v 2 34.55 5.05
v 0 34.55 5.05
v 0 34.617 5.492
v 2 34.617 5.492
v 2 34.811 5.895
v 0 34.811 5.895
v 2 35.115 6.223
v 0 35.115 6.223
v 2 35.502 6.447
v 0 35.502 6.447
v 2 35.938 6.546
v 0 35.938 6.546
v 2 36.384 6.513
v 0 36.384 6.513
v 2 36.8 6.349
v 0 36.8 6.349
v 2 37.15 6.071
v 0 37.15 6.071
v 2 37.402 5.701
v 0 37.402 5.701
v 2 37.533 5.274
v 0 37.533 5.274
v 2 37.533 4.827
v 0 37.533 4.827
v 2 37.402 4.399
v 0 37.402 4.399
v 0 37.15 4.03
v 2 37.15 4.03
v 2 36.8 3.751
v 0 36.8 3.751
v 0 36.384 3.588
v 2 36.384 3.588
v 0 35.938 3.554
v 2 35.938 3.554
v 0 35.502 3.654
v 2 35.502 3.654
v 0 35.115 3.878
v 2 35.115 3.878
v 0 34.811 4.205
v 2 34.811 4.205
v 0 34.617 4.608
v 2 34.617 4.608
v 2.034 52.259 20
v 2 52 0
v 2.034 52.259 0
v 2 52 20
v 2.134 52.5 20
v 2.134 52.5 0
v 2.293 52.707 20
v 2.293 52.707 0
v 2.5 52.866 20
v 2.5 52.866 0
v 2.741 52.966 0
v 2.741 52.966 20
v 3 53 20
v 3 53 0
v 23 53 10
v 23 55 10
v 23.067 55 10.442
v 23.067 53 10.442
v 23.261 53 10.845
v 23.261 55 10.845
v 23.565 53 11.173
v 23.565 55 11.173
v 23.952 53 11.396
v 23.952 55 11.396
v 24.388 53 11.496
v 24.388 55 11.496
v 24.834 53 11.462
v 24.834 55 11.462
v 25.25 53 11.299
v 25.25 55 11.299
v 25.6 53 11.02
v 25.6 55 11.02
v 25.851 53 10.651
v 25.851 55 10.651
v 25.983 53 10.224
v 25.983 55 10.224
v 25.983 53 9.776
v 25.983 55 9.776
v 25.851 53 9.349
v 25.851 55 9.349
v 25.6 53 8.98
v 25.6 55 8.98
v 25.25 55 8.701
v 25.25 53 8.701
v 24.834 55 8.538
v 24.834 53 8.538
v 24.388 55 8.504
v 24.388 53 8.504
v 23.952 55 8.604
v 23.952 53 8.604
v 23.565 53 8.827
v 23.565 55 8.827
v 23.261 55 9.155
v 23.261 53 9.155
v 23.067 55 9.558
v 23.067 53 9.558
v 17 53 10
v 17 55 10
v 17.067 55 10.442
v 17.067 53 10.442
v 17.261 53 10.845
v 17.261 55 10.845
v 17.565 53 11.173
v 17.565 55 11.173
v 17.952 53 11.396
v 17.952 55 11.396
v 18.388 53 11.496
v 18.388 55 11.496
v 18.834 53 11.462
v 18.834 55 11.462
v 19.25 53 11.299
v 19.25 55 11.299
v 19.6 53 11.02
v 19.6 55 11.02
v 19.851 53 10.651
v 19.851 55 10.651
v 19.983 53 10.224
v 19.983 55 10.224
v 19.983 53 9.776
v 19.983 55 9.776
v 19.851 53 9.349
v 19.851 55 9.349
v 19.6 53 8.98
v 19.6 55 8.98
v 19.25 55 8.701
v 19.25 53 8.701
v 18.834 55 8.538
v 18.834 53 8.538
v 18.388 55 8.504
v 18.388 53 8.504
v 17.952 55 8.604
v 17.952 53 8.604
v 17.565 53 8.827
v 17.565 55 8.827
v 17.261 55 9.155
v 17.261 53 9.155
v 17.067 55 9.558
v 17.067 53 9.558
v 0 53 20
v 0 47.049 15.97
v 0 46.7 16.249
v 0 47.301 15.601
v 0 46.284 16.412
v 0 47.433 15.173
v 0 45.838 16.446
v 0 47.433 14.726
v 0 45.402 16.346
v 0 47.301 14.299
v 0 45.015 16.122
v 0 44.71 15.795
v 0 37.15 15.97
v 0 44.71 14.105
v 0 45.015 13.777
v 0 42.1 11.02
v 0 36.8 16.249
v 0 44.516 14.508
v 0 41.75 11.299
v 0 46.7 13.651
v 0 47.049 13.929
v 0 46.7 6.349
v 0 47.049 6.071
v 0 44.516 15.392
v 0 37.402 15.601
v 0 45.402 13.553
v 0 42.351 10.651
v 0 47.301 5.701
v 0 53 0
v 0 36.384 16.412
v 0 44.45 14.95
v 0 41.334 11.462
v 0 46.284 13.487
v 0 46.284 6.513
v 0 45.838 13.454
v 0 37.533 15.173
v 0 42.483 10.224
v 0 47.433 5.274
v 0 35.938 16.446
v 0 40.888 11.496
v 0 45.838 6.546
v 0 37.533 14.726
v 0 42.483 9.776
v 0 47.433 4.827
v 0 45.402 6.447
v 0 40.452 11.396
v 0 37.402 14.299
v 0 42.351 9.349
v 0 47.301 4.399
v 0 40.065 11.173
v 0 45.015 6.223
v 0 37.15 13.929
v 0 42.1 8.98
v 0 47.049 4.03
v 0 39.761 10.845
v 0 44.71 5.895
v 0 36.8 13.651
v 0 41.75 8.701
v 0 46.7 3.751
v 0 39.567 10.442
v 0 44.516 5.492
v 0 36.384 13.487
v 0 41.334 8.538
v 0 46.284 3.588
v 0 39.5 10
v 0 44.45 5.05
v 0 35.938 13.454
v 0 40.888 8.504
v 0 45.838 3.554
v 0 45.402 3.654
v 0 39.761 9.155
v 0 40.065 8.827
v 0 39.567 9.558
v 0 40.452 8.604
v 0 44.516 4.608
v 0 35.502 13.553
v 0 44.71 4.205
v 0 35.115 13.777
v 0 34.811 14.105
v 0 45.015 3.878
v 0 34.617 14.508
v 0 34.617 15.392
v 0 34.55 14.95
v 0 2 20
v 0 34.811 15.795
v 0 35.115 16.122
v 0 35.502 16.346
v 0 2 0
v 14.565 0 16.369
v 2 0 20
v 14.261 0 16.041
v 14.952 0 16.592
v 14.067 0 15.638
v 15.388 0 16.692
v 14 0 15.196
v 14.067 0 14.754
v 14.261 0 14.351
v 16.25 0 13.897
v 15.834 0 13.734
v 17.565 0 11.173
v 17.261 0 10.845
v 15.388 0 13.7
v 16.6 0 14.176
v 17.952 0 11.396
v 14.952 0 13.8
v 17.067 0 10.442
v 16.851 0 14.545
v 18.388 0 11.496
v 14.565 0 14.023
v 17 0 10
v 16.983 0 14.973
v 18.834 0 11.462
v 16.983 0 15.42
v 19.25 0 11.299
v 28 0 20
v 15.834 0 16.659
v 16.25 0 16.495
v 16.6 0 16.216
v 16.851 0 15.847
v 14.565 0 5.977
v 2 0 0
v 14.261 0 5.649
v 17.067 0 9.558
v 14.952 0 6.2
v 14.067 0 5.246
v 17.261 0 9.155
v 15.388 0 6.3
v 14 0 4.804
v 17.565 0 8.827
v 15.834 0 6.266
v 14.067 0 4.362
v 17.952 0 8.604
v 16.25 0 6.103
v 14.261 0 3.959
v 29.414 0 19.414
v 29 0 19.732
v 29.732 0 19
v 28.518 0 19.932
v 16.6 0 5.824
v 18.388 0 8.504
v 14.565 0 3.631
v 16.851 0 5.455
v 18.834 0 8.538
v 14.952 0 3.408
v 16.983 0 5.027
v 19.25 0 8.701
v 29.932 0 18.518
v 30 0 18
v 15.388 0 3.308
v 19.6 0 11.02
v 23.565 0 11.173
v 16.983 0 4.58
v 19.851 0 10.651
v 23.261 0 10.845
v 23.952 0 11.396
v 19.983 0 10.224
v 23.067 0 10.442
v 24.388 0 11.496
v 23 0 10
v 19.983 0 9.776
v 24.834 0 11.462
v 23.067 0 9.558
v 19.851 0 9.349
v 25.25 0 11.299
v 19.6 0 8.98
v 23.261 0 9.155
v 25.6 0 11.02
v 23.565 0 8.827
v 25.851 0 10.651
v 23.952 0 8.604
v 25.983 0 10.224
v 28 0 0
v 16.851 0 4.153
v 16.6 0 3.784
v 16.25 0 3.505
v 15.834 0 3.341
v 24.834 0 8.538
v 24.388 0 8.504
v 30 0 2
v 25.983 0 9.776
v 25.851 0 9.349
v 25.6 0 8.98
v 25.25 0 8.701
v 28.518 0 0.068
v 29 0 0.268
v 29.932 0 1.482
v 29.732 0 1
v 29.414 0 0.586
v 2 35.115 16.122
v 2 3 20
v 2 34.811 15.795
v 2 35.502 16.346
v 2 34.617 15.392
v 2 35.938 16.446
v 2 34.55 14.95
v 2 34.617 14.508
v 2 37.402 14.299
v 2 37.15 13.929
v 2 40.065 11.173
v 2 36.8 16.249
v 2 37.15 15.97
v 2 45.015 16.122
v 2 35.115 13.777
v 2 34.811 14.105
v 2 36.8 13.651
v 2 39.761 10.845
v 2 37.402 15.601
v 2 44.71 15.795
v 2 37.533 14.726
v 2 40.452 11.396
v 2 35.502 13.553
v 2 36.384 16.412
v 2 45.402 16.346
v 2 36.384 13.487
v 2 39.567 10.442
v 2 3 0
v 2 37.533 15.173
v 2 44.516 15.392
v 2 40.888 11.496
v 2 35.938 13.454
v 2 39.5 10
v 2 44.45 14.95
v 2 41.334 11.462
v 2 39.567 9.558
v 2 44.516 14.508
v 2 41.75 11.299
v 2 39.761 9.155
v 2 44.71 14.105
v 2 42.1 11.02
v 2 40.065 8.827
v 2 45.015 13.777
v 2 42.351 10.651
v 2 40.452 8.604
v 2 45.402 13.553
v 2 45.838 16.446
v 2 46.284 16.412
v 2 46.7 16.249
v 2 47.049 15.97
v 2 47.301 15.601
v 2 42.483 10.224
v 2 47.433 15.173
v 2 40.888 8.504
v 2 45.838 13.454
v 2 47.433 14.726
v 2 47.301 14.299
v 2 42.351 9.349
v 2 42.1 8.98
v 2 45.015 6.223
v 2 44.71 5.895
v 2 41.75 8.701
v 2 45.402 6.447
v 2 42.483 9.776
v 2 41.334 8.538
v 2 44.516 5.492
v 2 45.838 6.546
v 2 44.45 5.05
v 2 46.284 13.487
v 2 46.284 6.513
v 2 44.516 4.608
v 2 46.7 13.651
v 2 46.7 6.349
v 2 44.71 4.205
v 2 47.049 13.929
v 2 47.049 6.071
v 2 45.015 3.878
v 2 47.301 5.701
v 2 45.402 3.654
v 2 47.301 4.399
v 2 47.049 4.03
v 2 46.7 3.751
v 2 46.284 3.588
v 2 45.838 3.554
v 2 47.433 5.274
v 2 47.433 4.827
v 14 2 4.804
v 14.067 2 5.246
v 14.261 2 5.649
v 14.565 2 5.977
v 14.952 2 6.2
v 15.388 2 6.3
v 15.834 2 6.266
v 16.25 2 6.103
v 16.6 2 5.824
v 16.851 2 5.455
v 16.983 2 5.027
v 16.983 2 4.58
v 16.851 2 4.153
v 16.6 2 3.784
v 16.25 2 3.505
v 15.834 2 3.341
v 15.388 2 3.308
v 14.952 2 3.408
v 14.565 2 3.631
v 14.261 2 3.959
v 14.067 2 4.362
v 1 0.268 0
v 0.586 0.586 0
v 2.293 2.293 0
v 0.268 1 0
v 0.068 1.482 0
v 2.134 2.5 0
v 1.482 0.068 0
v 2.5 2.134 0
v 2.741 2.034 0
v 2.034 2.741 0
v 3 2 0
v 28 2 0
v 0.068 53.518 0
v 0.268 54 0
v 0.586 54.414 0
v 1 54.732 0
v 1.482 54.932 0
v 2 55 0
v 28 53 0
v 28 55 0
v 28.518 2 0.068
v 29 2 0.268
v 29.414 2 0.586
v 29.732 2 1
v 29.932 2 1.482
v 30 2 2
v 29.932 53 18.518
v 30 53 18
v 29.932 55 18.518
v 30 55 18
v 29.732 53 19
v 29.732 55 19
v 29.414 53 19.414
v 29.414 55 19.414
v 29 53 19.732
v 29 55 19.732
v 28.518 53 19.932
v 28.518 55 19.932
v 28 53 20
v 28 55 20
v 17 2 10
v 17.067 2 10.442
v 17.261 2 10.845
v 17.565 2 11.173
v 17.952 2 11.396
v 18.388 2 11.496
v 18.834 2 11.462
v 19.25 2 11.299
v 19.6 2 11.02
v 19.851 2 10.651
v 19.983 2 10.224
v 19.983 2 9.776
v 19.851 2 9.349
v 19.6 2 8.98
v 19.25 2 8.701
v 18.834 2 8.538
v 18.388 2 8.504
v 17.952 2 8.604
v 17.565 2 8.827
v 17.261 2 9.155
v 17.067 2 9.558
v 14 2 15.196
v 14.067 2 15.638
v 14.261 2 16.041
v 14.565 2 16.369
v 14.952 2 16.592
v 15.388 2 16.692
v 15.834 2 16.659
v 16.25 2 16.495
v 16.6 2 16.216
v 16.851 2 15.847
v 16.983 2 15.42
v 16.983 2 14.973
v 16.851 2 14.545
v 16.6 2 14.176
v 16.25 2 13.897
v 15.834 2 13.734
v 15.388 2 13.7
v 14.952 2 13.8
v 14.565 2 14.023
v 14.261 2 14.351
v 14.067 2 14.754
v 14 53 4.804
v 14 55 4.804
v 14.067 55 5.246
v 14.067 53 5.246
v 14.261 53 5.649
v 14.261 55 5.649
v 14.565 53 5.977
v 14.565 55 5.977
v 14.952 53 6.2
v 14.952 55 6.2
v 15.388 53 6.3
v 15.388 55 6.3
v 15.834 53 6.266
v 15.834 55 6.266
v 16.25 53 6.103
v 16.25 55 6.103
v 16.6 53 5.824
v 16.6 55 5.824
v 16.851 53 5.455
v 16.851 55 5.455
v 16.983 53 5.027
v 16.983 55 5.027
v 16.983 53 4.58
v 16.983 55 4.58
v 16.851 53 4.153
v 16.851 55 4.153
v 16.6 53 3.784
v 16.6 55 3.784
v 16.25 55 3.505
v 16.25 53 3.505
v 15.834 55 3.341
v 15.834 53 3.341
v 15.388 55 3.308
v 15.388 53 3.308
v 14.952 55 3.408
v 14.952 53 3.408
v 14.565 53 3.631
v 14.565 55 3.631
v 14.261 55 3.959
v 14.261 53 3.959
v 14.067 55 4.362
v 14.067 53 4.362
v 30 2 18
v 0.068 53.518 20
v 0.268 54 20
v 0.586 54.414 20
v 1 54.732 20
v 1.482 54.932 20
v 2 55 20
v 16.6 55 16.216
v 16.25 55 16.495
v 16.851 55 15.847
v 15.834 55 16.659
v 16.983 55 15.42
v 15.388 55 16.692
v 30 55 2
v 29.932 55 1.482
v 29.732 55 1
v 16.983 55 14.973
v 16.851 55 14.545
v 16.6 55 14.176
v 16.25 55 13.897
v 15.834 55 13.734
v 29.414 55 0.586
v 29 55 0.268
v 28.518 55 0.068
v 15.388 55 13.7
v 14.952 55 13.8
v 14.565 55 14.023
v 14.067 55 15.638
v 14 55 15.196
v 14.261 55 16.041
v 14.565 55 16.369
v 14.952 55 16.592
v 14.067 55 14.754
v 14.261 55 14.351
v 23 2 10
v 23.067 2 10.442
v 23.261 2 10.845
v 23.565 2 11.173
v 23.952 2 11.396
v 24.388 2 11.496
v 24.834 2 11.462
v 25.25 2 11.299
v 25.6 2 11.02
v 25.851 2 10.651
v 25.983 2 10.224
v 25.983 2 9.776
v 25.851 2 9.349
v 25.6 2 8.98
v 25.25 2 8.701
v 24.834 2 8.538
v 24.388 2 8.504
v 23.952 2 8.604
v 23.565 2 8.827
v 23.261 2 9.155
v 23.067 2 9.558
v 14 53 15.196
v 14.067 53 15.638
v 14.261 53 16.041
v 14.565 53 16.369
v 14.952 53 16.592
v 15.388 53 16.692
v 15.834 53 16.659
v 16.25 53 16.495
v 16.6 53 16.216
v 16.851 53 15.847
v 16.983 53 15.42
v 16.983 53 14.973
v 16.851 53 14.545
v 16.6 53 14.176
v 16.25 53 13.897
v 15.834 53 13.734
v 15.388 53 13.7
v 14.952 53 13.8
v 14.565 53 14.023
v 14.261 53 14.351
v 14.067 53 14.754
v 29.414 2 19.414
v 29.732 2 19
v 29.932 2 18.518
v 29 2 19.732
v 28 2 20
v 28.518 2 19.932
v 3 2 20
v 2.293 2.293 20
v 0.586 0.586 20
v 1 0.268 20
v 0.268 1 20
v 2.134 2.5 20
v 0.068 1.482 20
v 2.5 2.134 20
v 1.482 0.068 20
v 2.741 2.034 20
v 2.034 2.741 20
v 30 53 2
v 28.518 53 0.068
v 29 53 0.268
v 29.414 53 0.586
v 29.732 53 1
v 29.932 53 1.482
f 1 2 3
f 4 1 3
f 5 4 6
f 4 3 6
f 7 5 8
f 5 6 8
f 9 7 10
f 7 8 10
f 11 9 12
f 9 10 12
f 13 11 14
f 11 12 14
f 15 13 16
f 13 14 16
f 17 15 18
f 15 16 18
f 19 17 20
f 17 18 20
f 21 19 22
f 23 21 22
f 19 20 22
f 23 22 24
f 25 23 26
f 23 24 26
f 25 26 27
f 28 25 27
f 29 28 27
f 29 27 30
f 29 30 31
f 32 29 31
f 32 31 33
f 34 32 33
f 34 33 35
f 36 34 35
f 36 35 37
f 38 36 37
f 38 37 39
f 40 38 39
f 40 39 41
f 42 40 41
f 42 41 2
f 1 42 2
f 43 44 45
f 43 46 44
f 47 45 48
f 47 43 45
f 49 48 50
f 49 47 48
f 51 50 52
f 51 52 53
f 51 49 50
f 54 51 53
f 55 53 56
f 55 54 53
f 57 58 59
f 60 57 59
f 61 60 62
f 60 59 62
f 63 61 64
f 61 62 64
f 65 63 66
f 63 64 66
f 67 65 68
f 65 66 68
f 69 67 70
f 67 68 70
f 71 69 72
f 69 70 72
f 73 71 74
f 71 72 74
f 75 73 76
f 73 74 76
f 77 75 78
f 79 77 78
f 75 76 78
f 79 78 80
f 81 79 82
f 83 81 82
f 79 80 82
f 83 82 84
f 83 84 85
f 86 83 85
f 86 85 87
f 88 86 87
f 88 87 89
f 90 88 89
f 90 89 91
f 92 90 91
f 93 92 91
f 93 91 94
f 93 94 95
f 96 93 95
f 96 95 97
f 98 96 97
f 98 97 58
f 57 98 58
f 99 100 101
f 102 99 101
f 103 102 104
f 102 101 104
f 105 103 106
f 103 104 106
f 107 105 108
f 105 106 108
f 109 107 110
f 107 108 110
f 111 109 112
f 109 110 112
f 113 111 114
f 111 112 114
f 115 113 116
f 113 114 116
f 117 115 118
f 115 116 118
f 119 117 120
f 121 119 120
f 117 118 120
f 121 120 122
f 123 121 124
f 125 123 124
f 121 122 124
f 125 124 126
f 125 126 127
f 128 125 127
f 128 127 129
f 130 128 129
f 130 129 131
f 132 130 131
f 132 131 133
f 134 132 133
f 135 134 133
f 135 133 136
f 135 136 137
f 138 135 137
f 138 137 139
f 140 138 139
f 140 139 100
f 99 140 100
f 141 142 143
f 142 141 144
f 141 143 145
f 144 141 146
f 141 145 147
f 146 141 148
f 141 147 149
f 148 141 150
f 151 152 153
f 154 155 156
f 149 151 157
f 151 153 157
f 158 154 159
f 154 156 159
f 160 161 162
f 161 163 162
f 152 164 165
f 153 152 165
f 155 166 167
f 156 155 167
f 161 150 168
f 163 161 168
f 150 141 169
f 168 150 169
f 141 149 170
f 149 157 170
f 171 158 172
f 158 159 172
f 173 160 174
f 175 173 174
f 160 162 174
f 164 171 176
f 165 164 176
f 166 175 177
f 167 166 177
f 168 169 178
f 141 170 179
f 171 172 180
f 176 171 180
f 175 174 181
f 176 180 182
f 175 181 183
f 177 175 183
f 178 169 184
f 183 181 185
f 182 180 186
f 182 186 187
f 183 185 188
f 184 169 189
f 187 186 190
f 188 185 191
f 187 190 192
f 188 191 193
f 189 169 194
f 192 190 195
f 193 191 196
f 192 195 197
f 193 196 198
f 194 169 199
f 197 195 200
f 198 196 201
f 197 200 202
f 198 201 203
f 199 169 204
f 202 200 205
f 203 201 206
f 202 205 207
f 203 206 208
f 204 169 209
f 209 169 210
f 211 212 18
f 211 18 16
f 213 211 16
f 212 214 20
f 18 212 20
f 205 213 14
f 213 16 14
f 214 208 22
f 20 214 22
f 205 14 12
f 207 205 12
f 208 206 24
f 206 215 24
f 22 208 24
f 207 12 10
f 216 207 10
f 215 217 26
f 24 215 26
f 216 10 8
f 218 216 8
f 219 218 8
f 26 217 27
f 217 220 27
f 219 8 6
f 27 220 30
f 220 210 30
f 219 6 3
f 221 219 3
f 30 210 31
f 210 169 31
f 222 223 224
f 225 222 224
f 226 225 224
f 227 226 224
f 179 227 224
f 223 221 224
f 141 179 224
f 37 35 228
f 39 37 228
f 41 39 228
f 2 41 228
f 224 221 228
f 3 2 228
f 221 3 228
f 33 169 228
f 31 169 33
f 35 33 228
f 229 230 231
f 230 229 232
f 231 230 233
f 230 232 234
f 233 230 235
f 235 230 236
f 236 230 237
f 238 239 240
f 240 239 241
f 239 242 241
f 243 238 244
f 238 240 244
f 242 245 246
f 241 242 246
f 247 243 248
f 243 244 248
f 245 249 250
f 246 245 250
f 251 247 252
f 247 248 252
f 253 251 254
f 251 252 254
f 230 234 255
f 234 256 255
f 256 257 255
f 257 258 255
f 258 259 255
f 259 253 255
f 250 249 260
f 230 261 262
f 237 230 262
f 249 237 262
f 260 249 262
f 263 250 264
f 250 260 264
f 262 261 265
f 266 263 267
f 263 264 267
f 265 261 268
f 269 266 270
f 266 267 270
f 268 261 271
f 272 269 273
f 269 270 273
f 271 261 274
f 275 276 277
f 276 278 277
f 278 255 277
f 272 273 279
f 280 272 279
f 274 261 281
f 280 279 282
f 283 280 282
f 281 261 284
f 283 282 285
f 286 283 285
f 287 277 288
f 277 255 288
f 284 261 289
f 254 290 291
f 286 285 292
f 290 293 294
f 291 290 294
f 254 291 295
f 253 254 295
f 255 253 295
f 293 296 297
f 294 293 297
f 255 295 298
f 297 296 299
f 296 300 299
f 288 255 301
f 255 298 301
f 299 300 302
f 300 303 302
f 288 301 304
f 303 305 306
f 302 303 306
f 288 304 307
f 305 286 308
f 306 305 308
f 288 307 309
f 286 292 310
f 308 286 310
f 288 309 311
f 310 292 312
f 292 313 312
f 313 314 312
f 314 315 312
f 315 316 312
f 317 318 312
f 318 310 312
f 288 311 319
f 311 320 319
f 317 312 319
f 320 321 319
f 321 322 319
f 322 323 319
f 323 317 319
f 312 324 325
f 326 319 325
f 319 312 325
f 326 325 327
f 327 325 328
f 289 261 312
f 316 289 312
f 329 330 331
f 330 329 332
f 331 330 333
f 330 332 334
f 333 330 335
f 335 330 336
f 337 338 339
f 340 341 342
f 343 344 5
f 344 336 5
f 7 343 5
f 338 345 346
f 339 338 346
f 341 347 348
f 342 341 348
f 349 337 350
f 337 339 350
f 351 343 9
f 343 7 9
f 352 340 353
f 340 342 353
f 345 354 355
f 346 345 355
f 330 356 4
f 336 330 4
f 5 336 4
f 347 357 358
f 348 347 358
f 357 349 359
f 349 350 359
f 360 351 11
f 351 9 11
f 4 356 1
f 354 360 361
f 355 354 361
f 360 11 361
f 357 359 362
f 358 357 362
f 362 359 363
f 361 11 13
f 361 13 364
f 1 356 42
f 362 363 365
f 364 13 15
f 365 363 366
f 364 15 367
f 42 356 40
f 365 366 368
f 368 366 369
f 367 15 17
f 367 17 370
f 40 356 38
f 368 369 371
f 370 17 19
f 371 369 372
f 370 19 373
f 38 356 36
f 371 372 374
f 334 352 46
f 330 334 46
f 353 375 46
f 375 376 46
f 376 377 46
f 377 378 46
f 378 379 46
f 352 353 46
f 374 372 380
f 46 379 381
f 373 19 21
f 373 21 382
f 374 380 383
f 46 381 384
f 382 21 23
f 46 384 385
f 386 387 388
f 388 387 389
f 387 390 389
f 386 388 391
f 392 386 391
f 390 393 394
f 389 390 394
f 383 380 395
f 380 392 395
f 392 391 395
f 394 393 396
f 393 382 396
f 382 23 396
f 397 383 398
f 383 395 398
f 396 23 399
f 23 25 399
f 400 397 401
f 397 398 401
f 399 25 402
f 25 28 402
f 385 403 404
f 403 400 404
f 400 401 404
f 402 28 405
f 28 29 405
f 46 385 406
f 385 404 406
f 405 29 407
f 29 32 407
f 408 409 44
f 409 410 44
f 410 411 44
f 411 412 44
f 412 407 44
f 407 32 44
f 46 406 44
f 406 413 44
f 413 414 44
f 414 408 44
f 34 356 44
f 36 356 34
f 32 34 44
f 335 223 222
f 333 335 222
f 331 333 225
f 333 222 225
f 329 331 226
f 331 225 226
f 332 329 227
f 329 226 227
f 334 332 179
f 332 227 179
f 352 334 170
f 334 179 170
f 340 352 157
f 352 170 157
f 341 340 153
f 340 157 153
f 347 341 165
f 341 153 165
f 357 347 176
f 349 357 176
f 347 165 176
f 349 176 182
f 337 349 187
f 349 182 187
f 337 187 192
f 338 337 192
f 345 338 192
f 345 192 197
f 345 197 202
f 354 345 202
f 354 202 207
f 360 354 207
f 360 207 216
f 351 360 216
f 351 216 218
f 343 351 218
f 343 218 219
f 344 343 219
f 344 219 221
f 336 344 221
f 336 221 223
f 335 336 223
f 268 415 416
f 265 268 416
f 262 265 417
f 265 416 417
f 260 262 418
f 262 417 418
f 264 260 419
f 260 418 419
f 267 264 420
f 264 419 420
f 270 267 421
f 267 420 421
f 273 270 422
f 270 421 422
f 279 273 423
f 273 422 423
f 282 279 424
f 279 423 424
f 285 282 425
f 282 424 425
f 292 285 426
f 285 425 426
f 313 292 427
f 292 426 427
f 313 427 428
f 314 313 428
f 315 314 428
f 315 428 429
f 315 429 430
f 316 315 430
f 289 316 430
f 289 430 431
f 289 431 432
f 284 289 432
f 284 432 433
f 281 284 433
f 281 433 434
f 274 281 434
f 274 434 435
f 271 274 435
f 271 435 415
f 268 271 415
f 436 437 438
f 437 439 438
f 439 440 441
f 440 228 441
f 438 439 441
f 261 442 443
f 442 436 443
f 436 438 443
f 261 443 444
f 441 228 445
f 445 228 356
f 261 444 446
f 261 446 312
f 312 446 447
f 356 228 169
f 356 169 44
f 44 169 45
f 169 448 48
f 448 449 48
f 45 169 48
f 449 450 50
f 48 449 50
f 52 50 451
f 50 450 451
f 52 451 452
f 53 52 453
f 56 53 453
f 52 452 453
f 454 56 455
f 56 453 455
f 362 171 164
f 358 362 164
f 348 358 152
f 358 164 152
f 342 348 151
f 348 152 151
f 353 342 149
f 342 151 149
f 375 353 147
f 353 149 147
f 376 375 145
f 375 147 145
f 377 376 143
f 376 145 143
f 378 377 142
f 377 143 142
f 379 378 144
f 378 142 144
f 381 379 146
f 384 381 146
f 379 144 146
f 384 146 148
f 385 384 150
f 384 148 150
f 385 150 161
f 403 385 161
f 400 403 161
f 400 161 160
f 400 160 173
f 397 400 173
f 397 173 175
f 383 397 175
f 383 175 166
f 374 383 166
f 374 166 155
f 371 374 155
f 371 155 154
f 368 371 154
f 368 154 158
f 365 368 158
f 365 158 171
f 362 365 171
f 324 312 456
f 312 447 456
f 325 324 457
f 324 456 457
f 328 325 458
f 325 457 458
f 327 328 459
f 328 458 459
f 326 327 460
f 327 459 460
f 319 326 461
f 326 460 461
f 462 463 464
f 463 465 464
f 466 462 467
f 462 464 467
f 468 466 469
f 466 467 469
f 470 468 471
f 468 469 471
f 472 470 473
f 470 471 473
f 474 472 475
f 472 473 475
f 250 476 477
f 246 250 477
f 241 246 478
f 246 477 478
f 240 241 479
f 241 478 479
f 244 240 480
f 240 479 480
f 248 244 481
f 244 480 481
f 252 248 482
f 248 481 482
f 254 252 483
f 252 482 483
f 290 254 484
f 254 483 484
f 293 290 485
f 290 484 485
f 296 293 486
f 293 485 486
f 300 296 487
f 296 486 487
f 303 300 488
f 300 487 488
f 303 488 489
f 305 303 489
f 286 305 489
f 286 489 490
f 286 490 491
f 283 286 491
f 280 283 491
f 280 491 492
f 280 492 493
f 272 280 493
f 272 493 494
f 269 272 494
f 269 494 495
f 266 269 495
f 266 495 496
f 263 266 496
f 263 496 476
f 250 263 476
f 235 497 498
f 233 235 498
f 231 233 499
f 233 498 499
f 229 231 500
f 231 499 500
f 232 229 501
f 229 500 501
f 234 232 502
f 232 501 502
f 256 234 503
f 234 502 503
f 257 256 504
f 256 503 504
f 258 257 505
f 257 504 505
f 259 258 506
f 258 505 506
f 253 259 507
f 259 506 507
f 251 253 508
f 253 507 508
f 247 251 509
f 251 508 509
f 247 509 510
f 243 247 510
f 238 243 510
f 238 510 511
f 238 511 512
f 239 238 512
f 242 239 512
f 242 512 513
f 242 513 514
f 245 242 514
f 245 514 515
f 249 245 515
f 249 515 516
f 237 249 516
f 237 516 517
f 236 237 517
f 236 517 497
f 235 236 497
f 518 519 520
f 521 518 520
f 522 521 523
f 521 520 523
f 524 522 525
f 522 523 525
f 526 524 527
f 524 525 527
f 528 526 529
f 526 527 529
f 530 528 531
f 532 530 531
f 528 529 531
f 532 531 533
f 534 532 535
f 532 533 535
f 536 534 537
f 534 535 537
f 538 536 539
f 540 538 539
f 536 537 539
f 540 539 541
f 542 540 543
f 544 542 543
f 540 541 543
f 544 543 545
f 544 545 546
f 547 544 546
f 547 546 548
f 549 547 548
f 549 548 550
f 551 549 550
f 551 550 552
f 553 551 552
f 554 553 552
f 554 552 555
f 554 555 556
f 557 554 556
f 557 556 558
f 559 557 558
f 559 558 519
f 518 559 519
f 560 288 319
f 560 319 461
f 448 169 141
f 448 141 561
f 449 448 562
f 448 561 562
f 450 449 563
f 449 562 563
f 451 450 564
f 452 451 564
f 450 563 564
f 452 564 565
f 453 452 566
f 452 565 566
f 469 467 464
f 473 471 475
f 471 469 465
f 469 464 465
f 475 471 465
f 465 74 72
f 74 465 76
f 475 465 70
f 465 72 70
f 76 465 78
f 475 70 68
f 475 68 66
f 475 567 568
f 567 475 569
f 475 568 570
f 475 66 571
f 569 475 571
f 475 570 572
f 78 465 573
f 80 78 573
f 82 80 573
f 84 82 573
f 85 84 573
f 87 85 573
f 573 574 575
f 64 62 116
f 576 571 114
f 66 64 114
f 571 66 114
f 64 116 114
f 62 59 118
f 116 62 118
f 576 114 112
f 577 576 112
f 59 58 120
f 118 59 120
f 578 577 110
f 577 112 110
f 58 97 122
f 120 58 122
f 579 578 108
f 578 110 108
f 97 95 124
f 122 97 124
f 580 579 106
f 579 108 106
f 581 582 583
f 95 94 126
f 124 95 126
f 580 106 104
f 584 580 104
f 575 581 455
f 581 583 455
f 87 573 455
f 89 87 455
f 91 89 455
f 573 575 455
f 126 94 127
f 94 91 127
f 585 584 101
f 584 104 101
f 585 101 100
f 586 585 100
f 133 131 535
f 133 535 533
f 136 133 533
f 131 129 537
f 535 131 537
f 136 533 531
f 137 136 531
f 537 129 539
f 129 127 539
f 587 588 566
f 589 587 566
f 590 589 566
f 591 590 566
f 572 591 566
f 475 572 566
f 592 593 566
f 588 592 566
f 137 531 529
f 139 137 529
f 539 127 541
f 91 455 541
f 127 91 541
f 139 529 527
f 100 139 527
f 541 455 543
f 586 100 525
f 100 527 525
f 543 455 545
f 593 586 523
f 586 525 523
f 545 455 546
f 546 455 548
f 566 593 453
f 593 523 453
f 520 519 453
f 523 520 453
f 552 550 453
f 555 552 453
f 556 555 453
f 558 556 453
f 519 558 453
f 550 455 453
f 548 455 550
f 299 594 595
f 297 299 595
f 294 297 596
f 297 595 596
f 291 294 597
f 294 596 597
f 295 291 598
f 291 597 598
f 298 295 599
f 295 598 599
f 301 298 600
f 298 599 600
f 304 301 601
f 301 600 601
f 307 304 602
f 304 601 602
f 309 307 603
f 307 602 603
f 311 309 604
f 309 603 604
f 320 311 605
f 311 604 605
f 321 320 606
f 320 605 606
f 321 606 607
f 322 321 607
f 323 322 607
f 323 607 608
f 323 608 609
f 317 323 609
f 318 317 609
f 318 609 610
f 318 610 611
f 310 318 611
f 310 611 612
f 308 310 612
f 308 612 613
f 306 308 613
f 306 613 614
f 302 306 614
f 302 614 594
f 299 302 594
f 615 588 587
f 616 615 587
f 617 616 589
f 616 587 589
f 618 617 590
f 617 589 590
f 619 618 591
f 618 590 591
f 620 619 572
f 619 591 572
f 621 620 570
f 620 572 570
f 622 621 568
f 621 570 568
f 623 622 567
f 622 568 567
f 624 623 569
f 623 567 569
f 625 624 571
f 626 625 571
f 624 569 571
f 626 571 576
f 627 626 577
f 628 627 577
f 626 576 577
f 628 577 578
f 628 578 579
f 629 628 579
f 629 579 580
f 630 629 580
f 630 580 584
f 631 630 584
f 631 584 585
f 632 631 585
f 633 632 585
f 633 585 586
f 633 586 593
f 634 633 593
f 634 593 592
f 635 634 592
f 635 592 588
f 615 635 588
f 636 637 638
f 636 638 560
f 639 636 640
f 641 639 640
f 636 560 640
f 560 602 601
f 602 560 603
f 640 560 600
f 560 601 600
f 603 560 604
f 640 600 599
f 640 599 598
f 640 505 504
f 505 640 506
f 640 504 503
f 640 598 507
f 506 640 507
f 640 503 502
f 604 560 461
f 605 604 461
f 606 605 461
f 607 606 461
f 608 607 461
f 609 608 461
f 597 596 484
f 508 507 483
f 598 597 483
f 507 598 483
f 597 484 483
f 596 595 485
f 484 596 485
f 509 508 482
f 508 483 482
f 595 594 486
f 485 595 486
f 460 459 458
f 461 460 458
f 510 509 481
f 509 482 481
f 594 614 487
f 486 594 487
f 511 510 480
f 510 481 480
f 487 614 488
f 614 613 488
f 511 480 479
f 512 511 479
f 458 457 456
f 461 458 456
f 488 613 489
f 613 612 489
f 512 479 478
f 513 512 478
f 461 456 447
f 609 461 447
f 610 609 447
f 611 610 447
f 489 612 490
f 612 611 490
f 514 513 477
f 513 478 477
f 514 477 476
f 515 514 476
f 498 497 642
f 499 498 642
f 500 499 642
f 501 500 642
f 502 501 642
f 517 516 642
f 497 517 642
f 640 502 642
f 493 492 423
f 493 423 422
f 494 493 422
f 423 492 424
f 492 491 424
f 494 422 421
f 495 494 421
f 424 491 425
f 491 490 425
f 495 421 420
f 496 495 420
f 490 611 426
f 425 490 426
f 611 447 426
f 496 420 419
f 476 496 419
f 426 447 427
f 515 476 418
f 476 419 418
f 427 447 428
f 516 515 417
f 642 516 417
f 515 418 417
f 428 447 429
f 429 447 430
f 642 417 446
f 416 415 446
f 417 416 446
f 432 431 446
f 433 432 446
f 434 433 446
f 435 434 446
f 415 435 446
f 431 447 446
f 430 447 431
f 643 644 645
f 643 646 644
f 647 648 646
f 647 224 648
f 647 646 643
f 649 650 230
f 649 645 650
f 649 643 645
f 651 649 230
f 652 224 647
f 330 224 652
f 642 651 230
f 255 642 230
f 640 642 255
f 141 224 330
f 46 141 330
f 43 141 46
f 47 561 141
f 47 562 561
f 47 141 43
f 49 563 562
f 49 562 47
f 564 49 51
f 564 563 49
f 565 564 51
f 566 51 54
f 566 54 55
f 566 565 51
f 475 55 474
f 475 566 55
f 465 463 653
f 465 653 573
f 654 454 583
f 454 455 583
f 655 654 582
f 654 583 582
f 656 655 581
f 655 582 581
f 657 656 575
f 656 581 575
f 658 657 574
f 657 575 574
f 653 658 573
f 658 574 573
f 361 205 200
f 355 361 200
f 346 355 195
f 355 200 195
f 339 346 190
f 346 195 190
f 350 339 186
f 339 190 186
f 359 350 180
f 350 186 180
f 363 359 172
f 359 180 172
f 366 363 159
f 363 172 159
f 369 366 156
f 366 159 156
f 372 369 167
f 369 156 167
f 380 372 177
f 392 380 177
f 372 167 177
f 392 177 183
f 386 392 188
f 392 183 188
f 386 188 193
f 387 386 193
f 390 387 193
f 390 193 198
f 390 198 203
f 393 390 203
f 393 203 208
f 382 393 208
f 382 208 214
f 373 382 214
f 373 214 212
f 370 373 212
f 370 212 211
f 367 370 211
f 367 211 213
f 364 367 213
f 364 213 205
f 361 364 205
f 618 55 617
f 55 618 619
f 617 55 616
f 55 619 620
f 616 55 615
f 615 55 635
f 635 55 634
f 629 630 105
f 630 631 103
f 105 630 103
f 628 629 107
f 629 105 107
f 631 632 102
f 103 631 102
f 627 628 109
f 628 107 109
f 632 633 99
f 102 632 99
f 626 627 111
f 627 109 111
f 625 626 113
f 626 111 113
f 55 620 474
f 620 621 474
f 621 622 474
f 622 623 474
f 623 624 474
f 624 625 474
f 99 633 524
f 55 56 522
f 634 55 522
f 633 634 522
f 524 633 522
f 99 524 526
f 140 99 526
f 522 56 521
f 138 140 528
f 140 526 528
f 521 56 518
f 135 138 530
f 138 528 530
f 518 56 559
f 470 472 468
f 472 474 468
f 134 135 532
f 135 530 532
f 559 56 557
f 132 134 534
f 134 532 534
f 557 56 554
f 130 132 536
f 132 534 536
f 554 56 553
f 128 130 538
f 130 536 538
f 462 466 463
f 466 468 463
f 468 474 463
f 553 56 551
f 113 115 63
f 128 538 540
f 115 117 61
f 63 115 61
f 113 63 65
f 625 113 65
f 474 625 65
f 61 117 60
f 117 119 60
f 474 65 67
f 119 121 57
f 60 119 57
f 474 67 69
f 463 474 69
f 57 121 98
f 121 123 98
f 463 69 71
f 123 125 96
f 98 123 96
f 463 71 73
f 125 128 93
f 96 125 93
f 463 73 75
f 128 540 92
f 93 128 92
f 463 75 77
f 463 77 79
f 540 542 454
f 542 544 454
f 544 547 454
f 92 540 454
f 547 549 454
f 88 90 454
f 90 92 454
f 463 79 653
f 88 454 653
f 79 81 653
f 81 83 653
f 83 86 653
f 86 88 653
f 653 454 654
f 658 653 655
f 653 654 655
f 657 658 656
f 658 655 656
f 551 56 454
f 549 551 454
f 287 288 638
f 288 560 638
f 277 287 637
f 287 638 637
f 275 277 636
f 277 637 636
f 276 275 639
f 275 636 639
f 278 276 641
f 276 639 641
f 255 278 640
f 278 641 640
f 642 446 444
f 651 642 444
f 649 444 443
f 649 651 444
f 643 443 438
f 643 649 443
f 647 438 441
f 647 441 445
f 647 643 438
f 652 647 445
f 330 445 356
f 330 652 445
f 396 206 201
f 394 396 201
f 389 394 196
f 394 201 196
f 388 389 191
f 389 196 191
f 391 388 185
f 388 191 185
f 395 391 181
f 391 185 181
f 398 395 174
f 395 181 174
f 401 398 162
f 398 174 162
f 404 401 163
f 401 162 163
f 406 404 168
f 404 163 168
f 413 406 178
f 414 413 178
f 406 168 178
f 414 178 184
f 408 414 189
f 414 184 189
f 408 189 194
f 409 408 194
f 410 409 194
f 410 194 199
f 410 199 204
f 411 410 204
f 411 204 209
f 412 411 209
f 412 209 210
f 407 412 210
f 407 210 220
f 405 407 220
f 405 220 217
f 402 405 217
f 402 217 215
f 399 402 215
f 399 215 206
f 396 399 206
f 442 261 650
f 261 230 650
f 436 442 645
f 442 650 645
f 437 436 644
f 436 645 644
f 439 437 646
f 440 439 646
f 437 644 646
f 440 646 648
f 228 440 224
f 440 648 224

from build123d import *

# Parameters (mm, degrees)
EXTRUDE_1_DEPTH     = 20
SKETCH_2_R          = 1.5
CUT_EXTRUDE_1_DEPTH = 10
SKETCH_4_R          = 1.5
CUT_EXTRUDE_2_DEPTH = 66.76473219
FILLET_1_R          = 2
FILLET_2_R          = 1
FILLET_3_R          = 2


with BuildPart() as part:
    # 草图1 → 凸台-拉伸1 (new body)
    with BuildSketch(Plane.XY):
        Polygon((0, 0), (30, 0), (30, 2), (2, 2), (2, 53), (30, 53), (30, 55), (0, 55), align=None)
    extrude(amount=EXTRUDE_1_DEPTH)

    # 草图2 → 切除-拉伸1 (cut)
    with BuildSketch(Plane.ZY):
        with Locations(Location((10, 41, 0), (0, 0, 270))):
            Circle(SKETCH_2_R)
        with Locations(Location((5.050252532, 45.949747468, 0), (0, 0, 270))):
            Circle(SKETCH_2_R)
        with Locations(Location((14.949747468, 45.949747468, 0), (0, 0, 270))):
            Circle(SKETCH_2_R)
        with Locations(Location((14.949747468, 36.050252532, 0), (0, 0, 270))):
            Circle(SKETCH_2_R)
        with Locations(Location((5.050252532, 36.050252532, 0), (0, 0, 270))):
            Circle(SKETCH_2_R)
    extrude(amount=-CUT_EXTRUDE_1_DEPTH, mode=Mode.SUBTRACT)

    # 草图4 → 切除-拉伸2 (cut, through all)
    with BuildSketch(Plane(origin=(0, 55, 0), x_dir=(1, 0, 0), z_dir=(0, 1, 0))):
        with Locations(Location((18.5, -10, 0), (0, 0, 180))):
            Circle(SKETCH_4_R)
        with Locations(Location((24.5, -10, 0), (0, 0, 180))):
            Circle(SKETCH_4_R)
        with Locations(Location((15.5, -15.196152423, 0), (0, 0, 180))):
            Circle(SKETCH_4_R)
        with Locations(Location((15.5, -4.803847577, 0), (0, 0, 180))):
            Circle(SKETCH_4_R)
    extrude(amount=-CUT_EXTRUDE_2_DEPTH, mode=Mode.SUBTRACT)

    # 圆角1
    fillet_1_edges = [part.edges().sort_by_distance(p)[0] for p in [
        (0, 55, 10),
        (0, 0, 10),
    ]]
    fillet(fillet_1_edges, radius=FILLET_1_R)

    # 圆角2
    fillet_2_edges = [part.edges().sort_by_distance(p)[0] for p in [
        (2, 53, 10),
        (2, 2, 10),
    ]]
    fillet(fillet_2_edges, radius=FILLET_2_R)

    # 圆角3
    fillet_3_edges = [part.edges().sort_by_distance(p)[0] for p in [
        (30, 1, 0),
        (30, 1, 20),
        (30, 54, 20),
        (30, 54, 0),
    ]]
    fillet(fillet_3_edges, radius=FILLET_3_R)


solid = part.part
